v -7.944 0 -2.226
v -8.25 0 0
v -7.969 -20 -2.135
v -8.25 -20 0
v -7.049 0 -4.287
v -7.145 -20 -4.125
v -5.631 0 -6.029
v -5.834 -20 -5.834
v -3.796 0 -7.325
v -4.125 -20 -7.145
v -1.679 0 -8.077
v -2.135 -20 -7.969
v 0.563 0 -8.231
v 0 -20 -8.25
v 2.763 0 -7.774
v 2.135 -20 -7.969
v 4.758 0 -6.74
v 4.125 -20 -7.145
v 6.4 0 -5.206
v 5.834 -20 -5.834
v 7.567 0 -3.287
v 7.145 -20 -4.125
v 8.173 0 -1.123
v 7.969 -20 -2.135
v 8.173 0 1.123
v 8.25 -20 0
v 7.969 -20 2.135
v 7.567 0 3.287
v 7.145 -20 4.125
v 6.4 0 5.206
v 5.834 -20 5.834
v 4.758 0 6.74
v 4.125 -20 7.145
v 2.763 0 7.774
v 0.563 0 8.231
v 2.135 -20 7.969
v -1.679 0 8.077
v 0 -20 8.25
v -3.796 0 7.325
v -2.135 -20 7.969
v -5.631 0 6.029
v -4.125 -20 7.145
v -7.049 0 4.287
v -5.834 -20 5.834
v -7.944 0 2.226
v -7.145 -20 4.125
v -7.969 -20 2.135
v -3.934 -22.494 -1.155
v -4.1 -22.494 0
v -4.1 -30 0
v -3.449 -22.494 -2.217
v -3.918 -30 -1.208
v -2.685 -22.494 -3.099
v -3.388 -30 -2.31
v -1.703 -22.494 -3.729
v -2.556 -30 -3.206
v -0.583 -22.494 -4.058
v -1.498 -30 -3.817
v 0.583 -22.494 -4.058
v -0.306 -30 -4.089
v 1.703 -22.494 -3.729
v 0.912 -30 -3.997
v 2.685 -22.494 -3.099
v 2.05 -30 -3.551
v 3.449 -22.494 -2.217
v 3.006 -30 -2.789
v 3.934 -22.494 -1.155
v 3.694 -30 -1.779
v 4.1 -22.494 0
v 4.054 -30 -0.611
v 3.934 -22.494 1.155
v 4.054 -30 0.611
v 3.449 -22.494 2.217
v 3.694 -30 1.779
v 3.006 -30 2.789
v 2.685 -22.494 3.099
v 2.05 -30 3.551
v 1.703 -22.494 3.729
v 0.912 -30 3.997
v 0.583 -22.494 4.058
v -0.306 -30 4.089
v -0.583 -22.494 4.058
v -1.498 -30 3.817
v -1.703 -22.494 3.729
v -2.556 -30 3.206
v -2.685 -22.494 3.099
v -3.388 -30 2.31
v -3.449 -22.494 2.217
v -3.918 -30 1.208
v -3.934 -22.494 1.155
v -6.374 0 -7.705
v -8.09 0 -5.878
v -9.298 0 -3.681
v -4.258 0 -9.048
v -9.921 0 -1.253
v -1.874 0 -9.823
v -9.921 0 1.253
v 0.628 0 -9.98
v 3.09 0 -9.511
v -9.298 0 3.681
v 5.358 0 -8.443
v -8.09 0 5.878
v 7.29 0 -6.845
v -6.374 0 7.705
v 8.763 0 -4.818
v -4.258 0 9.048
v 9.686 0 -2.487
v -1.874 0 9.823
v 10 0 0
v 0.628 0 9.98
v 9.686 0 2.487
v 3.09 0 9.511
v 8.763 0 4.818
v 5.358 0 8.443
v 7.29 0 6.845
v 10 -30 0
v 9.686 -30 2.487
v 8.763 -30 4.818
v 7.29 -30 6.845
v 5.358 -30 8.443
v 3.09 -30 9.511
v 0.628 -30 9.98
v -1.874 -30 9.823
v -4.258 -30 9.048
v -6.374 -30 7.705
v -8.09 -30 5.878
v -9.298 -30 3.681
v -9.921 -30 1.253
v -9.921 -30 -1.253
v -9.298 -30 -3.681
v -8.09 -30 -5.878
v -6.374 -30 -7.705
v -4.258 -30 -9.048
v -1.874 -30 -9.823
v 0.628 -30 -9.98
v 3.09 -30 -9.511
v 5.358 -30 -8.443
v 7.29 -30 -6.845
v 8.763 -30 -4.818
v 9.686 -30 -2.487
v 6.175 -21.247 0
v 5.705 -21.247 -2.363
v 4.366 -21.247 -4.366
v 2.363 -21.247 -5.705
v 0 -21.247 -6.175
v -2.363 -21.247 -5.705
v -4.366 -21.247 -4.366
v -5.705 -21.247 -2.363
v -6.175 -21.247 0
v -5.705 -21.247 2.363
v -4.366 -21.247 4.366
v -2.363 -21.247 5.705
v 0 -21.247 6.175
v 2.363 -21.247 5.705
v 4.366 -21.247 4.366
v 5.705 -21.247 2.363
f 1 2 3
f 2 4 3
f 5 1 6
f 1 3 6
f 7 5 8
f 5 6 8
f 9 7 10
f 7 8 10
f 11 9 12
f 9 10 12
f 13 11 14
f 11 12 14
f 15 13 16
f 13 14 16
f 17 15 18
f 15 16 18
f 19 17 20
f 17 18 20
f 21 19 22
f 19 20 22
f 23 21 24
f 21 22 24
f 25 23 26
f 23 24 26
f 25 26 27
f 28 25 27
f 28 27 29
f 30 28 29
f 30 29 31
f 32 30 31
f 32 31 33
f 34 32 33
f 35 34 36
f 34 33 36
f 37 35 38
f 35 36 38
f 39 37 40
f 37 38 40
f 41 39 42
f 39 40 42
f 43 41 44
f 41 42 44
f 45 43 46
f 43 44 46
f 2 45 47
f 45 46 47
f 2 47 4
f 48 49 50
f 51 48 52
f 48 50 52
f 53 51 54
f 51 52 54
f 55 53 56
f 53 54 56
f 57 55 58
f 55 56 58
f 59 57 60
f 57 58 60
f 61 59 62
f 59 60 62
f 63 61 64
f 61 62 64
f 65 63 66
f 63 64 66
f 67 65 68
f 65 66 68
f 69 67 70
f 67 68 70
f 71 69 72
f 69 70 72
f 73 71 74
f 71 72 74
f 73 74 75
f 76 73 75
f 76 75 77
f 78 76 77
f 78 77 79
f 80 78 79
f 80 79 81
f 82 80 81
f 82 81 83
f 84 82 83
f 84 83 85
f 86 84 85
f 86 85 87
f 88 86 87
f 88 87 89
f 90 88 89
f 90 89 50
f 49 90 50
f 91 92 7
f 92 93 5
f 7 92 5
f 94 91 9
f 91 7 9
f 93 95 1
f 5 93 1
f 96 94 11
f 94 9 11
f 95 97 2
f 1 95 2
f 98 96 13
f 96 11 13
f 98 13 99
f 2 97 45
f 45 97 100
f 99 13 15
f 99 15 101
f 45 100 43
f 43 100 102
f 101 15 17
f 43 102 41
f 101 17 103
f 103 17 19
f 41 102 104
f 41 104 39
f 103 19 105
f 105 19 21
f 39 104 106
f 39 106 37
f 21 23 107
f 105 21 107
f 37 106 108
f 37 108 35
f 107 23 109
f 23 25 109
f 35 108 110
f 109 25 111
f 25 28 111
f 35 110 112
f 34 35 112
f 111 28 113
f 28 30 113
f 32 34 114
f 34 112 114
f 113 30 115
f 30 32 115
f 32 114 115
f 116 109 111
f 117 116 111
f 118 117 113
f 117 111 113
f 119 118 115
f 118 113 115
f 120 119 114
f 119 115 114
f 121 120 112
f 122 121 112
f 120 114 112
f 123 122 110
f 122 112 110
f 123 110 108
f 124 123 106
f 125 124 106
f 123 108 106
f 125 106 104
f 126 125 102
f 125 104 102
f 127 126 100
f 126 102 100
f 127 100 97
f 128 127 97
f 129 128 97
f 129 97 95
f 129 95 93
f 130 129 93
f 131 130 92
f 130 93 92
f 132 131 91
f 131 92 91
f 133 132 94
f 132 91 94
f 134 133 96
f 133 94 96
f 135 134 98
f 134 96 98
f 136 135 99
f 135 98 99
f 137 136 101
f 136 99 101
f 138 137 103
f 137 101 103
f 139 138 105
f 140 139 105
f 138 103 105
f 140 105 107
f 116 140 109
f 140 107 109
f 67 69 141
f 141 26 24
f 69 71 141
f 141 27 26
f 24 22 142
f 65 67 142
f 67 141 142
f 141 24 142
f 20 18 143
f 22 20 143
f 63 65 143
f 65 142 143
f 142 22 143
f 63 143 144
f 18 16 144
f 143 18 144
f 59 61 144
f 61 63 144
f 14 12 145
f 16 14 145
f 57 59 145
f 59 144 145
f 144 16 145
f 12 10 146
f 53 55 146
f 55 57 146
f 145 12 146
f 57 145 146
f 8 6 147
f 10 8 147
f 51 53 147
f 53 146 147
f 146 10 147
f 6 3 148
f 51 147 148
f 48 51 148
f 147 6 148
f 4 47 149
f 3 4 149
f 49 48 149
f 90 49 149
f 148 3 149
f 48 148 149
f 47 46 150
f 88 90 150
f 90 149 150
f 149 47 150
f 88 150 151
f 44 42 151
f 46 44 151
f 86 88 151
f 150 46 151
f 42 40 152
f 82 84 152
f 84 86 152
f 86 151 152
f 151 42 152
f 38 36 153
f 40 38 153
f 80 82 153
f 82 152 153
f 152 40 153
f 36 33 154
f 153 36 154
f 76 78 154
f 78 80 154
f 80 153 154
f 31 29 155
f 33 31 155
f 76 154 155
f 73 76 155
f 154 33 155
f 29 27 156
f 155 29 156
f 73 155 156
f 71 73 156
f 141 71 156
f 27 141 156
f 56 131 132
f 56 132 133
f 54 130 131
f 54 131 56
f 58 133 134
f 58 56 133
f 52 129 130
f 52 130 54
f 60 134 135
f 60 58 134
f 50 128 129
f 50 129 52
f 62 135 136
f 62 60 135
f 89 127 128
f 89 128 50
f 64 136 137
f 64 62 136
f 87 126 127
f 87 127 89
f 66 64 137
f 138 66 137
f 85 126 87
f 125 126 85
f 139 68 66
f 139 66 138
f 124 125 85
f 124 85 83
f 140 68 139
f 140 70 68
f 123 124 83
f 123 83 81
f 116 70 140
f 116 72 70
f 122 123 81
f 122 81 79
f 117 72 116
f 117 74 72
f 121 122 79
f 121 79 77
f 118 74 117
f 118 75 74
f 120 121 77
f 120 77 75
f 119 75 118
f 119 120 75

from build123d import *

# Parameters (mm, degrees)
F0_R     = 10
F1_DEPTH = 30
F3_D     = 16.5
F3_DEPTH = 20
F3_TIP   = 4.957100107
F5_D     = 8.2
F5_DEPTH = 100
F5_START = 22.4935716
F5_TIP   = 2.463528538


with BuildPart() as f1:
    # F0 (on Front) → F1 (new body)
    with BuildSketch(Plane.XZ):
        Circle(F0_R)
    extrude(amount=F1_DEPTH)

    # F3
    with Locations(Plane(origin=(0, 0, 0), x_dir=(1, 0, 0), z_dir=(0, 1, 0))):
        with Locations((0, 0)):
            Hole(F3_D / 2, depth=F3_DEPTH)
            with Locations((0, 0, -(F3_DEPTH + F3_TIP / 2))):  # 118° drill point
                Cone(0, F3_D / 2, F3_TIP, mode=Mode.SUBTRACT)

    # F5
    # its depths count from where the whole tool has entered the part; down to there all is cleared
    with Locations(Plane(origin=(0, 0, 0), x_dir=(1, 0, 0), z_dir=(0, 1, 0)).offset(-F5_START)):
        with Locations((0, 0)):
            Hole(F5_D / 2, depth=F5_DEPTH)
            with Locations((0, 0, -(F5_DEPTH + F5_TIP / 2))):  # 118° drill point
                Cone(0, F5_D / 2, F5_TIP, mode=Mode.SUBTRACT)


solid = f1.part
